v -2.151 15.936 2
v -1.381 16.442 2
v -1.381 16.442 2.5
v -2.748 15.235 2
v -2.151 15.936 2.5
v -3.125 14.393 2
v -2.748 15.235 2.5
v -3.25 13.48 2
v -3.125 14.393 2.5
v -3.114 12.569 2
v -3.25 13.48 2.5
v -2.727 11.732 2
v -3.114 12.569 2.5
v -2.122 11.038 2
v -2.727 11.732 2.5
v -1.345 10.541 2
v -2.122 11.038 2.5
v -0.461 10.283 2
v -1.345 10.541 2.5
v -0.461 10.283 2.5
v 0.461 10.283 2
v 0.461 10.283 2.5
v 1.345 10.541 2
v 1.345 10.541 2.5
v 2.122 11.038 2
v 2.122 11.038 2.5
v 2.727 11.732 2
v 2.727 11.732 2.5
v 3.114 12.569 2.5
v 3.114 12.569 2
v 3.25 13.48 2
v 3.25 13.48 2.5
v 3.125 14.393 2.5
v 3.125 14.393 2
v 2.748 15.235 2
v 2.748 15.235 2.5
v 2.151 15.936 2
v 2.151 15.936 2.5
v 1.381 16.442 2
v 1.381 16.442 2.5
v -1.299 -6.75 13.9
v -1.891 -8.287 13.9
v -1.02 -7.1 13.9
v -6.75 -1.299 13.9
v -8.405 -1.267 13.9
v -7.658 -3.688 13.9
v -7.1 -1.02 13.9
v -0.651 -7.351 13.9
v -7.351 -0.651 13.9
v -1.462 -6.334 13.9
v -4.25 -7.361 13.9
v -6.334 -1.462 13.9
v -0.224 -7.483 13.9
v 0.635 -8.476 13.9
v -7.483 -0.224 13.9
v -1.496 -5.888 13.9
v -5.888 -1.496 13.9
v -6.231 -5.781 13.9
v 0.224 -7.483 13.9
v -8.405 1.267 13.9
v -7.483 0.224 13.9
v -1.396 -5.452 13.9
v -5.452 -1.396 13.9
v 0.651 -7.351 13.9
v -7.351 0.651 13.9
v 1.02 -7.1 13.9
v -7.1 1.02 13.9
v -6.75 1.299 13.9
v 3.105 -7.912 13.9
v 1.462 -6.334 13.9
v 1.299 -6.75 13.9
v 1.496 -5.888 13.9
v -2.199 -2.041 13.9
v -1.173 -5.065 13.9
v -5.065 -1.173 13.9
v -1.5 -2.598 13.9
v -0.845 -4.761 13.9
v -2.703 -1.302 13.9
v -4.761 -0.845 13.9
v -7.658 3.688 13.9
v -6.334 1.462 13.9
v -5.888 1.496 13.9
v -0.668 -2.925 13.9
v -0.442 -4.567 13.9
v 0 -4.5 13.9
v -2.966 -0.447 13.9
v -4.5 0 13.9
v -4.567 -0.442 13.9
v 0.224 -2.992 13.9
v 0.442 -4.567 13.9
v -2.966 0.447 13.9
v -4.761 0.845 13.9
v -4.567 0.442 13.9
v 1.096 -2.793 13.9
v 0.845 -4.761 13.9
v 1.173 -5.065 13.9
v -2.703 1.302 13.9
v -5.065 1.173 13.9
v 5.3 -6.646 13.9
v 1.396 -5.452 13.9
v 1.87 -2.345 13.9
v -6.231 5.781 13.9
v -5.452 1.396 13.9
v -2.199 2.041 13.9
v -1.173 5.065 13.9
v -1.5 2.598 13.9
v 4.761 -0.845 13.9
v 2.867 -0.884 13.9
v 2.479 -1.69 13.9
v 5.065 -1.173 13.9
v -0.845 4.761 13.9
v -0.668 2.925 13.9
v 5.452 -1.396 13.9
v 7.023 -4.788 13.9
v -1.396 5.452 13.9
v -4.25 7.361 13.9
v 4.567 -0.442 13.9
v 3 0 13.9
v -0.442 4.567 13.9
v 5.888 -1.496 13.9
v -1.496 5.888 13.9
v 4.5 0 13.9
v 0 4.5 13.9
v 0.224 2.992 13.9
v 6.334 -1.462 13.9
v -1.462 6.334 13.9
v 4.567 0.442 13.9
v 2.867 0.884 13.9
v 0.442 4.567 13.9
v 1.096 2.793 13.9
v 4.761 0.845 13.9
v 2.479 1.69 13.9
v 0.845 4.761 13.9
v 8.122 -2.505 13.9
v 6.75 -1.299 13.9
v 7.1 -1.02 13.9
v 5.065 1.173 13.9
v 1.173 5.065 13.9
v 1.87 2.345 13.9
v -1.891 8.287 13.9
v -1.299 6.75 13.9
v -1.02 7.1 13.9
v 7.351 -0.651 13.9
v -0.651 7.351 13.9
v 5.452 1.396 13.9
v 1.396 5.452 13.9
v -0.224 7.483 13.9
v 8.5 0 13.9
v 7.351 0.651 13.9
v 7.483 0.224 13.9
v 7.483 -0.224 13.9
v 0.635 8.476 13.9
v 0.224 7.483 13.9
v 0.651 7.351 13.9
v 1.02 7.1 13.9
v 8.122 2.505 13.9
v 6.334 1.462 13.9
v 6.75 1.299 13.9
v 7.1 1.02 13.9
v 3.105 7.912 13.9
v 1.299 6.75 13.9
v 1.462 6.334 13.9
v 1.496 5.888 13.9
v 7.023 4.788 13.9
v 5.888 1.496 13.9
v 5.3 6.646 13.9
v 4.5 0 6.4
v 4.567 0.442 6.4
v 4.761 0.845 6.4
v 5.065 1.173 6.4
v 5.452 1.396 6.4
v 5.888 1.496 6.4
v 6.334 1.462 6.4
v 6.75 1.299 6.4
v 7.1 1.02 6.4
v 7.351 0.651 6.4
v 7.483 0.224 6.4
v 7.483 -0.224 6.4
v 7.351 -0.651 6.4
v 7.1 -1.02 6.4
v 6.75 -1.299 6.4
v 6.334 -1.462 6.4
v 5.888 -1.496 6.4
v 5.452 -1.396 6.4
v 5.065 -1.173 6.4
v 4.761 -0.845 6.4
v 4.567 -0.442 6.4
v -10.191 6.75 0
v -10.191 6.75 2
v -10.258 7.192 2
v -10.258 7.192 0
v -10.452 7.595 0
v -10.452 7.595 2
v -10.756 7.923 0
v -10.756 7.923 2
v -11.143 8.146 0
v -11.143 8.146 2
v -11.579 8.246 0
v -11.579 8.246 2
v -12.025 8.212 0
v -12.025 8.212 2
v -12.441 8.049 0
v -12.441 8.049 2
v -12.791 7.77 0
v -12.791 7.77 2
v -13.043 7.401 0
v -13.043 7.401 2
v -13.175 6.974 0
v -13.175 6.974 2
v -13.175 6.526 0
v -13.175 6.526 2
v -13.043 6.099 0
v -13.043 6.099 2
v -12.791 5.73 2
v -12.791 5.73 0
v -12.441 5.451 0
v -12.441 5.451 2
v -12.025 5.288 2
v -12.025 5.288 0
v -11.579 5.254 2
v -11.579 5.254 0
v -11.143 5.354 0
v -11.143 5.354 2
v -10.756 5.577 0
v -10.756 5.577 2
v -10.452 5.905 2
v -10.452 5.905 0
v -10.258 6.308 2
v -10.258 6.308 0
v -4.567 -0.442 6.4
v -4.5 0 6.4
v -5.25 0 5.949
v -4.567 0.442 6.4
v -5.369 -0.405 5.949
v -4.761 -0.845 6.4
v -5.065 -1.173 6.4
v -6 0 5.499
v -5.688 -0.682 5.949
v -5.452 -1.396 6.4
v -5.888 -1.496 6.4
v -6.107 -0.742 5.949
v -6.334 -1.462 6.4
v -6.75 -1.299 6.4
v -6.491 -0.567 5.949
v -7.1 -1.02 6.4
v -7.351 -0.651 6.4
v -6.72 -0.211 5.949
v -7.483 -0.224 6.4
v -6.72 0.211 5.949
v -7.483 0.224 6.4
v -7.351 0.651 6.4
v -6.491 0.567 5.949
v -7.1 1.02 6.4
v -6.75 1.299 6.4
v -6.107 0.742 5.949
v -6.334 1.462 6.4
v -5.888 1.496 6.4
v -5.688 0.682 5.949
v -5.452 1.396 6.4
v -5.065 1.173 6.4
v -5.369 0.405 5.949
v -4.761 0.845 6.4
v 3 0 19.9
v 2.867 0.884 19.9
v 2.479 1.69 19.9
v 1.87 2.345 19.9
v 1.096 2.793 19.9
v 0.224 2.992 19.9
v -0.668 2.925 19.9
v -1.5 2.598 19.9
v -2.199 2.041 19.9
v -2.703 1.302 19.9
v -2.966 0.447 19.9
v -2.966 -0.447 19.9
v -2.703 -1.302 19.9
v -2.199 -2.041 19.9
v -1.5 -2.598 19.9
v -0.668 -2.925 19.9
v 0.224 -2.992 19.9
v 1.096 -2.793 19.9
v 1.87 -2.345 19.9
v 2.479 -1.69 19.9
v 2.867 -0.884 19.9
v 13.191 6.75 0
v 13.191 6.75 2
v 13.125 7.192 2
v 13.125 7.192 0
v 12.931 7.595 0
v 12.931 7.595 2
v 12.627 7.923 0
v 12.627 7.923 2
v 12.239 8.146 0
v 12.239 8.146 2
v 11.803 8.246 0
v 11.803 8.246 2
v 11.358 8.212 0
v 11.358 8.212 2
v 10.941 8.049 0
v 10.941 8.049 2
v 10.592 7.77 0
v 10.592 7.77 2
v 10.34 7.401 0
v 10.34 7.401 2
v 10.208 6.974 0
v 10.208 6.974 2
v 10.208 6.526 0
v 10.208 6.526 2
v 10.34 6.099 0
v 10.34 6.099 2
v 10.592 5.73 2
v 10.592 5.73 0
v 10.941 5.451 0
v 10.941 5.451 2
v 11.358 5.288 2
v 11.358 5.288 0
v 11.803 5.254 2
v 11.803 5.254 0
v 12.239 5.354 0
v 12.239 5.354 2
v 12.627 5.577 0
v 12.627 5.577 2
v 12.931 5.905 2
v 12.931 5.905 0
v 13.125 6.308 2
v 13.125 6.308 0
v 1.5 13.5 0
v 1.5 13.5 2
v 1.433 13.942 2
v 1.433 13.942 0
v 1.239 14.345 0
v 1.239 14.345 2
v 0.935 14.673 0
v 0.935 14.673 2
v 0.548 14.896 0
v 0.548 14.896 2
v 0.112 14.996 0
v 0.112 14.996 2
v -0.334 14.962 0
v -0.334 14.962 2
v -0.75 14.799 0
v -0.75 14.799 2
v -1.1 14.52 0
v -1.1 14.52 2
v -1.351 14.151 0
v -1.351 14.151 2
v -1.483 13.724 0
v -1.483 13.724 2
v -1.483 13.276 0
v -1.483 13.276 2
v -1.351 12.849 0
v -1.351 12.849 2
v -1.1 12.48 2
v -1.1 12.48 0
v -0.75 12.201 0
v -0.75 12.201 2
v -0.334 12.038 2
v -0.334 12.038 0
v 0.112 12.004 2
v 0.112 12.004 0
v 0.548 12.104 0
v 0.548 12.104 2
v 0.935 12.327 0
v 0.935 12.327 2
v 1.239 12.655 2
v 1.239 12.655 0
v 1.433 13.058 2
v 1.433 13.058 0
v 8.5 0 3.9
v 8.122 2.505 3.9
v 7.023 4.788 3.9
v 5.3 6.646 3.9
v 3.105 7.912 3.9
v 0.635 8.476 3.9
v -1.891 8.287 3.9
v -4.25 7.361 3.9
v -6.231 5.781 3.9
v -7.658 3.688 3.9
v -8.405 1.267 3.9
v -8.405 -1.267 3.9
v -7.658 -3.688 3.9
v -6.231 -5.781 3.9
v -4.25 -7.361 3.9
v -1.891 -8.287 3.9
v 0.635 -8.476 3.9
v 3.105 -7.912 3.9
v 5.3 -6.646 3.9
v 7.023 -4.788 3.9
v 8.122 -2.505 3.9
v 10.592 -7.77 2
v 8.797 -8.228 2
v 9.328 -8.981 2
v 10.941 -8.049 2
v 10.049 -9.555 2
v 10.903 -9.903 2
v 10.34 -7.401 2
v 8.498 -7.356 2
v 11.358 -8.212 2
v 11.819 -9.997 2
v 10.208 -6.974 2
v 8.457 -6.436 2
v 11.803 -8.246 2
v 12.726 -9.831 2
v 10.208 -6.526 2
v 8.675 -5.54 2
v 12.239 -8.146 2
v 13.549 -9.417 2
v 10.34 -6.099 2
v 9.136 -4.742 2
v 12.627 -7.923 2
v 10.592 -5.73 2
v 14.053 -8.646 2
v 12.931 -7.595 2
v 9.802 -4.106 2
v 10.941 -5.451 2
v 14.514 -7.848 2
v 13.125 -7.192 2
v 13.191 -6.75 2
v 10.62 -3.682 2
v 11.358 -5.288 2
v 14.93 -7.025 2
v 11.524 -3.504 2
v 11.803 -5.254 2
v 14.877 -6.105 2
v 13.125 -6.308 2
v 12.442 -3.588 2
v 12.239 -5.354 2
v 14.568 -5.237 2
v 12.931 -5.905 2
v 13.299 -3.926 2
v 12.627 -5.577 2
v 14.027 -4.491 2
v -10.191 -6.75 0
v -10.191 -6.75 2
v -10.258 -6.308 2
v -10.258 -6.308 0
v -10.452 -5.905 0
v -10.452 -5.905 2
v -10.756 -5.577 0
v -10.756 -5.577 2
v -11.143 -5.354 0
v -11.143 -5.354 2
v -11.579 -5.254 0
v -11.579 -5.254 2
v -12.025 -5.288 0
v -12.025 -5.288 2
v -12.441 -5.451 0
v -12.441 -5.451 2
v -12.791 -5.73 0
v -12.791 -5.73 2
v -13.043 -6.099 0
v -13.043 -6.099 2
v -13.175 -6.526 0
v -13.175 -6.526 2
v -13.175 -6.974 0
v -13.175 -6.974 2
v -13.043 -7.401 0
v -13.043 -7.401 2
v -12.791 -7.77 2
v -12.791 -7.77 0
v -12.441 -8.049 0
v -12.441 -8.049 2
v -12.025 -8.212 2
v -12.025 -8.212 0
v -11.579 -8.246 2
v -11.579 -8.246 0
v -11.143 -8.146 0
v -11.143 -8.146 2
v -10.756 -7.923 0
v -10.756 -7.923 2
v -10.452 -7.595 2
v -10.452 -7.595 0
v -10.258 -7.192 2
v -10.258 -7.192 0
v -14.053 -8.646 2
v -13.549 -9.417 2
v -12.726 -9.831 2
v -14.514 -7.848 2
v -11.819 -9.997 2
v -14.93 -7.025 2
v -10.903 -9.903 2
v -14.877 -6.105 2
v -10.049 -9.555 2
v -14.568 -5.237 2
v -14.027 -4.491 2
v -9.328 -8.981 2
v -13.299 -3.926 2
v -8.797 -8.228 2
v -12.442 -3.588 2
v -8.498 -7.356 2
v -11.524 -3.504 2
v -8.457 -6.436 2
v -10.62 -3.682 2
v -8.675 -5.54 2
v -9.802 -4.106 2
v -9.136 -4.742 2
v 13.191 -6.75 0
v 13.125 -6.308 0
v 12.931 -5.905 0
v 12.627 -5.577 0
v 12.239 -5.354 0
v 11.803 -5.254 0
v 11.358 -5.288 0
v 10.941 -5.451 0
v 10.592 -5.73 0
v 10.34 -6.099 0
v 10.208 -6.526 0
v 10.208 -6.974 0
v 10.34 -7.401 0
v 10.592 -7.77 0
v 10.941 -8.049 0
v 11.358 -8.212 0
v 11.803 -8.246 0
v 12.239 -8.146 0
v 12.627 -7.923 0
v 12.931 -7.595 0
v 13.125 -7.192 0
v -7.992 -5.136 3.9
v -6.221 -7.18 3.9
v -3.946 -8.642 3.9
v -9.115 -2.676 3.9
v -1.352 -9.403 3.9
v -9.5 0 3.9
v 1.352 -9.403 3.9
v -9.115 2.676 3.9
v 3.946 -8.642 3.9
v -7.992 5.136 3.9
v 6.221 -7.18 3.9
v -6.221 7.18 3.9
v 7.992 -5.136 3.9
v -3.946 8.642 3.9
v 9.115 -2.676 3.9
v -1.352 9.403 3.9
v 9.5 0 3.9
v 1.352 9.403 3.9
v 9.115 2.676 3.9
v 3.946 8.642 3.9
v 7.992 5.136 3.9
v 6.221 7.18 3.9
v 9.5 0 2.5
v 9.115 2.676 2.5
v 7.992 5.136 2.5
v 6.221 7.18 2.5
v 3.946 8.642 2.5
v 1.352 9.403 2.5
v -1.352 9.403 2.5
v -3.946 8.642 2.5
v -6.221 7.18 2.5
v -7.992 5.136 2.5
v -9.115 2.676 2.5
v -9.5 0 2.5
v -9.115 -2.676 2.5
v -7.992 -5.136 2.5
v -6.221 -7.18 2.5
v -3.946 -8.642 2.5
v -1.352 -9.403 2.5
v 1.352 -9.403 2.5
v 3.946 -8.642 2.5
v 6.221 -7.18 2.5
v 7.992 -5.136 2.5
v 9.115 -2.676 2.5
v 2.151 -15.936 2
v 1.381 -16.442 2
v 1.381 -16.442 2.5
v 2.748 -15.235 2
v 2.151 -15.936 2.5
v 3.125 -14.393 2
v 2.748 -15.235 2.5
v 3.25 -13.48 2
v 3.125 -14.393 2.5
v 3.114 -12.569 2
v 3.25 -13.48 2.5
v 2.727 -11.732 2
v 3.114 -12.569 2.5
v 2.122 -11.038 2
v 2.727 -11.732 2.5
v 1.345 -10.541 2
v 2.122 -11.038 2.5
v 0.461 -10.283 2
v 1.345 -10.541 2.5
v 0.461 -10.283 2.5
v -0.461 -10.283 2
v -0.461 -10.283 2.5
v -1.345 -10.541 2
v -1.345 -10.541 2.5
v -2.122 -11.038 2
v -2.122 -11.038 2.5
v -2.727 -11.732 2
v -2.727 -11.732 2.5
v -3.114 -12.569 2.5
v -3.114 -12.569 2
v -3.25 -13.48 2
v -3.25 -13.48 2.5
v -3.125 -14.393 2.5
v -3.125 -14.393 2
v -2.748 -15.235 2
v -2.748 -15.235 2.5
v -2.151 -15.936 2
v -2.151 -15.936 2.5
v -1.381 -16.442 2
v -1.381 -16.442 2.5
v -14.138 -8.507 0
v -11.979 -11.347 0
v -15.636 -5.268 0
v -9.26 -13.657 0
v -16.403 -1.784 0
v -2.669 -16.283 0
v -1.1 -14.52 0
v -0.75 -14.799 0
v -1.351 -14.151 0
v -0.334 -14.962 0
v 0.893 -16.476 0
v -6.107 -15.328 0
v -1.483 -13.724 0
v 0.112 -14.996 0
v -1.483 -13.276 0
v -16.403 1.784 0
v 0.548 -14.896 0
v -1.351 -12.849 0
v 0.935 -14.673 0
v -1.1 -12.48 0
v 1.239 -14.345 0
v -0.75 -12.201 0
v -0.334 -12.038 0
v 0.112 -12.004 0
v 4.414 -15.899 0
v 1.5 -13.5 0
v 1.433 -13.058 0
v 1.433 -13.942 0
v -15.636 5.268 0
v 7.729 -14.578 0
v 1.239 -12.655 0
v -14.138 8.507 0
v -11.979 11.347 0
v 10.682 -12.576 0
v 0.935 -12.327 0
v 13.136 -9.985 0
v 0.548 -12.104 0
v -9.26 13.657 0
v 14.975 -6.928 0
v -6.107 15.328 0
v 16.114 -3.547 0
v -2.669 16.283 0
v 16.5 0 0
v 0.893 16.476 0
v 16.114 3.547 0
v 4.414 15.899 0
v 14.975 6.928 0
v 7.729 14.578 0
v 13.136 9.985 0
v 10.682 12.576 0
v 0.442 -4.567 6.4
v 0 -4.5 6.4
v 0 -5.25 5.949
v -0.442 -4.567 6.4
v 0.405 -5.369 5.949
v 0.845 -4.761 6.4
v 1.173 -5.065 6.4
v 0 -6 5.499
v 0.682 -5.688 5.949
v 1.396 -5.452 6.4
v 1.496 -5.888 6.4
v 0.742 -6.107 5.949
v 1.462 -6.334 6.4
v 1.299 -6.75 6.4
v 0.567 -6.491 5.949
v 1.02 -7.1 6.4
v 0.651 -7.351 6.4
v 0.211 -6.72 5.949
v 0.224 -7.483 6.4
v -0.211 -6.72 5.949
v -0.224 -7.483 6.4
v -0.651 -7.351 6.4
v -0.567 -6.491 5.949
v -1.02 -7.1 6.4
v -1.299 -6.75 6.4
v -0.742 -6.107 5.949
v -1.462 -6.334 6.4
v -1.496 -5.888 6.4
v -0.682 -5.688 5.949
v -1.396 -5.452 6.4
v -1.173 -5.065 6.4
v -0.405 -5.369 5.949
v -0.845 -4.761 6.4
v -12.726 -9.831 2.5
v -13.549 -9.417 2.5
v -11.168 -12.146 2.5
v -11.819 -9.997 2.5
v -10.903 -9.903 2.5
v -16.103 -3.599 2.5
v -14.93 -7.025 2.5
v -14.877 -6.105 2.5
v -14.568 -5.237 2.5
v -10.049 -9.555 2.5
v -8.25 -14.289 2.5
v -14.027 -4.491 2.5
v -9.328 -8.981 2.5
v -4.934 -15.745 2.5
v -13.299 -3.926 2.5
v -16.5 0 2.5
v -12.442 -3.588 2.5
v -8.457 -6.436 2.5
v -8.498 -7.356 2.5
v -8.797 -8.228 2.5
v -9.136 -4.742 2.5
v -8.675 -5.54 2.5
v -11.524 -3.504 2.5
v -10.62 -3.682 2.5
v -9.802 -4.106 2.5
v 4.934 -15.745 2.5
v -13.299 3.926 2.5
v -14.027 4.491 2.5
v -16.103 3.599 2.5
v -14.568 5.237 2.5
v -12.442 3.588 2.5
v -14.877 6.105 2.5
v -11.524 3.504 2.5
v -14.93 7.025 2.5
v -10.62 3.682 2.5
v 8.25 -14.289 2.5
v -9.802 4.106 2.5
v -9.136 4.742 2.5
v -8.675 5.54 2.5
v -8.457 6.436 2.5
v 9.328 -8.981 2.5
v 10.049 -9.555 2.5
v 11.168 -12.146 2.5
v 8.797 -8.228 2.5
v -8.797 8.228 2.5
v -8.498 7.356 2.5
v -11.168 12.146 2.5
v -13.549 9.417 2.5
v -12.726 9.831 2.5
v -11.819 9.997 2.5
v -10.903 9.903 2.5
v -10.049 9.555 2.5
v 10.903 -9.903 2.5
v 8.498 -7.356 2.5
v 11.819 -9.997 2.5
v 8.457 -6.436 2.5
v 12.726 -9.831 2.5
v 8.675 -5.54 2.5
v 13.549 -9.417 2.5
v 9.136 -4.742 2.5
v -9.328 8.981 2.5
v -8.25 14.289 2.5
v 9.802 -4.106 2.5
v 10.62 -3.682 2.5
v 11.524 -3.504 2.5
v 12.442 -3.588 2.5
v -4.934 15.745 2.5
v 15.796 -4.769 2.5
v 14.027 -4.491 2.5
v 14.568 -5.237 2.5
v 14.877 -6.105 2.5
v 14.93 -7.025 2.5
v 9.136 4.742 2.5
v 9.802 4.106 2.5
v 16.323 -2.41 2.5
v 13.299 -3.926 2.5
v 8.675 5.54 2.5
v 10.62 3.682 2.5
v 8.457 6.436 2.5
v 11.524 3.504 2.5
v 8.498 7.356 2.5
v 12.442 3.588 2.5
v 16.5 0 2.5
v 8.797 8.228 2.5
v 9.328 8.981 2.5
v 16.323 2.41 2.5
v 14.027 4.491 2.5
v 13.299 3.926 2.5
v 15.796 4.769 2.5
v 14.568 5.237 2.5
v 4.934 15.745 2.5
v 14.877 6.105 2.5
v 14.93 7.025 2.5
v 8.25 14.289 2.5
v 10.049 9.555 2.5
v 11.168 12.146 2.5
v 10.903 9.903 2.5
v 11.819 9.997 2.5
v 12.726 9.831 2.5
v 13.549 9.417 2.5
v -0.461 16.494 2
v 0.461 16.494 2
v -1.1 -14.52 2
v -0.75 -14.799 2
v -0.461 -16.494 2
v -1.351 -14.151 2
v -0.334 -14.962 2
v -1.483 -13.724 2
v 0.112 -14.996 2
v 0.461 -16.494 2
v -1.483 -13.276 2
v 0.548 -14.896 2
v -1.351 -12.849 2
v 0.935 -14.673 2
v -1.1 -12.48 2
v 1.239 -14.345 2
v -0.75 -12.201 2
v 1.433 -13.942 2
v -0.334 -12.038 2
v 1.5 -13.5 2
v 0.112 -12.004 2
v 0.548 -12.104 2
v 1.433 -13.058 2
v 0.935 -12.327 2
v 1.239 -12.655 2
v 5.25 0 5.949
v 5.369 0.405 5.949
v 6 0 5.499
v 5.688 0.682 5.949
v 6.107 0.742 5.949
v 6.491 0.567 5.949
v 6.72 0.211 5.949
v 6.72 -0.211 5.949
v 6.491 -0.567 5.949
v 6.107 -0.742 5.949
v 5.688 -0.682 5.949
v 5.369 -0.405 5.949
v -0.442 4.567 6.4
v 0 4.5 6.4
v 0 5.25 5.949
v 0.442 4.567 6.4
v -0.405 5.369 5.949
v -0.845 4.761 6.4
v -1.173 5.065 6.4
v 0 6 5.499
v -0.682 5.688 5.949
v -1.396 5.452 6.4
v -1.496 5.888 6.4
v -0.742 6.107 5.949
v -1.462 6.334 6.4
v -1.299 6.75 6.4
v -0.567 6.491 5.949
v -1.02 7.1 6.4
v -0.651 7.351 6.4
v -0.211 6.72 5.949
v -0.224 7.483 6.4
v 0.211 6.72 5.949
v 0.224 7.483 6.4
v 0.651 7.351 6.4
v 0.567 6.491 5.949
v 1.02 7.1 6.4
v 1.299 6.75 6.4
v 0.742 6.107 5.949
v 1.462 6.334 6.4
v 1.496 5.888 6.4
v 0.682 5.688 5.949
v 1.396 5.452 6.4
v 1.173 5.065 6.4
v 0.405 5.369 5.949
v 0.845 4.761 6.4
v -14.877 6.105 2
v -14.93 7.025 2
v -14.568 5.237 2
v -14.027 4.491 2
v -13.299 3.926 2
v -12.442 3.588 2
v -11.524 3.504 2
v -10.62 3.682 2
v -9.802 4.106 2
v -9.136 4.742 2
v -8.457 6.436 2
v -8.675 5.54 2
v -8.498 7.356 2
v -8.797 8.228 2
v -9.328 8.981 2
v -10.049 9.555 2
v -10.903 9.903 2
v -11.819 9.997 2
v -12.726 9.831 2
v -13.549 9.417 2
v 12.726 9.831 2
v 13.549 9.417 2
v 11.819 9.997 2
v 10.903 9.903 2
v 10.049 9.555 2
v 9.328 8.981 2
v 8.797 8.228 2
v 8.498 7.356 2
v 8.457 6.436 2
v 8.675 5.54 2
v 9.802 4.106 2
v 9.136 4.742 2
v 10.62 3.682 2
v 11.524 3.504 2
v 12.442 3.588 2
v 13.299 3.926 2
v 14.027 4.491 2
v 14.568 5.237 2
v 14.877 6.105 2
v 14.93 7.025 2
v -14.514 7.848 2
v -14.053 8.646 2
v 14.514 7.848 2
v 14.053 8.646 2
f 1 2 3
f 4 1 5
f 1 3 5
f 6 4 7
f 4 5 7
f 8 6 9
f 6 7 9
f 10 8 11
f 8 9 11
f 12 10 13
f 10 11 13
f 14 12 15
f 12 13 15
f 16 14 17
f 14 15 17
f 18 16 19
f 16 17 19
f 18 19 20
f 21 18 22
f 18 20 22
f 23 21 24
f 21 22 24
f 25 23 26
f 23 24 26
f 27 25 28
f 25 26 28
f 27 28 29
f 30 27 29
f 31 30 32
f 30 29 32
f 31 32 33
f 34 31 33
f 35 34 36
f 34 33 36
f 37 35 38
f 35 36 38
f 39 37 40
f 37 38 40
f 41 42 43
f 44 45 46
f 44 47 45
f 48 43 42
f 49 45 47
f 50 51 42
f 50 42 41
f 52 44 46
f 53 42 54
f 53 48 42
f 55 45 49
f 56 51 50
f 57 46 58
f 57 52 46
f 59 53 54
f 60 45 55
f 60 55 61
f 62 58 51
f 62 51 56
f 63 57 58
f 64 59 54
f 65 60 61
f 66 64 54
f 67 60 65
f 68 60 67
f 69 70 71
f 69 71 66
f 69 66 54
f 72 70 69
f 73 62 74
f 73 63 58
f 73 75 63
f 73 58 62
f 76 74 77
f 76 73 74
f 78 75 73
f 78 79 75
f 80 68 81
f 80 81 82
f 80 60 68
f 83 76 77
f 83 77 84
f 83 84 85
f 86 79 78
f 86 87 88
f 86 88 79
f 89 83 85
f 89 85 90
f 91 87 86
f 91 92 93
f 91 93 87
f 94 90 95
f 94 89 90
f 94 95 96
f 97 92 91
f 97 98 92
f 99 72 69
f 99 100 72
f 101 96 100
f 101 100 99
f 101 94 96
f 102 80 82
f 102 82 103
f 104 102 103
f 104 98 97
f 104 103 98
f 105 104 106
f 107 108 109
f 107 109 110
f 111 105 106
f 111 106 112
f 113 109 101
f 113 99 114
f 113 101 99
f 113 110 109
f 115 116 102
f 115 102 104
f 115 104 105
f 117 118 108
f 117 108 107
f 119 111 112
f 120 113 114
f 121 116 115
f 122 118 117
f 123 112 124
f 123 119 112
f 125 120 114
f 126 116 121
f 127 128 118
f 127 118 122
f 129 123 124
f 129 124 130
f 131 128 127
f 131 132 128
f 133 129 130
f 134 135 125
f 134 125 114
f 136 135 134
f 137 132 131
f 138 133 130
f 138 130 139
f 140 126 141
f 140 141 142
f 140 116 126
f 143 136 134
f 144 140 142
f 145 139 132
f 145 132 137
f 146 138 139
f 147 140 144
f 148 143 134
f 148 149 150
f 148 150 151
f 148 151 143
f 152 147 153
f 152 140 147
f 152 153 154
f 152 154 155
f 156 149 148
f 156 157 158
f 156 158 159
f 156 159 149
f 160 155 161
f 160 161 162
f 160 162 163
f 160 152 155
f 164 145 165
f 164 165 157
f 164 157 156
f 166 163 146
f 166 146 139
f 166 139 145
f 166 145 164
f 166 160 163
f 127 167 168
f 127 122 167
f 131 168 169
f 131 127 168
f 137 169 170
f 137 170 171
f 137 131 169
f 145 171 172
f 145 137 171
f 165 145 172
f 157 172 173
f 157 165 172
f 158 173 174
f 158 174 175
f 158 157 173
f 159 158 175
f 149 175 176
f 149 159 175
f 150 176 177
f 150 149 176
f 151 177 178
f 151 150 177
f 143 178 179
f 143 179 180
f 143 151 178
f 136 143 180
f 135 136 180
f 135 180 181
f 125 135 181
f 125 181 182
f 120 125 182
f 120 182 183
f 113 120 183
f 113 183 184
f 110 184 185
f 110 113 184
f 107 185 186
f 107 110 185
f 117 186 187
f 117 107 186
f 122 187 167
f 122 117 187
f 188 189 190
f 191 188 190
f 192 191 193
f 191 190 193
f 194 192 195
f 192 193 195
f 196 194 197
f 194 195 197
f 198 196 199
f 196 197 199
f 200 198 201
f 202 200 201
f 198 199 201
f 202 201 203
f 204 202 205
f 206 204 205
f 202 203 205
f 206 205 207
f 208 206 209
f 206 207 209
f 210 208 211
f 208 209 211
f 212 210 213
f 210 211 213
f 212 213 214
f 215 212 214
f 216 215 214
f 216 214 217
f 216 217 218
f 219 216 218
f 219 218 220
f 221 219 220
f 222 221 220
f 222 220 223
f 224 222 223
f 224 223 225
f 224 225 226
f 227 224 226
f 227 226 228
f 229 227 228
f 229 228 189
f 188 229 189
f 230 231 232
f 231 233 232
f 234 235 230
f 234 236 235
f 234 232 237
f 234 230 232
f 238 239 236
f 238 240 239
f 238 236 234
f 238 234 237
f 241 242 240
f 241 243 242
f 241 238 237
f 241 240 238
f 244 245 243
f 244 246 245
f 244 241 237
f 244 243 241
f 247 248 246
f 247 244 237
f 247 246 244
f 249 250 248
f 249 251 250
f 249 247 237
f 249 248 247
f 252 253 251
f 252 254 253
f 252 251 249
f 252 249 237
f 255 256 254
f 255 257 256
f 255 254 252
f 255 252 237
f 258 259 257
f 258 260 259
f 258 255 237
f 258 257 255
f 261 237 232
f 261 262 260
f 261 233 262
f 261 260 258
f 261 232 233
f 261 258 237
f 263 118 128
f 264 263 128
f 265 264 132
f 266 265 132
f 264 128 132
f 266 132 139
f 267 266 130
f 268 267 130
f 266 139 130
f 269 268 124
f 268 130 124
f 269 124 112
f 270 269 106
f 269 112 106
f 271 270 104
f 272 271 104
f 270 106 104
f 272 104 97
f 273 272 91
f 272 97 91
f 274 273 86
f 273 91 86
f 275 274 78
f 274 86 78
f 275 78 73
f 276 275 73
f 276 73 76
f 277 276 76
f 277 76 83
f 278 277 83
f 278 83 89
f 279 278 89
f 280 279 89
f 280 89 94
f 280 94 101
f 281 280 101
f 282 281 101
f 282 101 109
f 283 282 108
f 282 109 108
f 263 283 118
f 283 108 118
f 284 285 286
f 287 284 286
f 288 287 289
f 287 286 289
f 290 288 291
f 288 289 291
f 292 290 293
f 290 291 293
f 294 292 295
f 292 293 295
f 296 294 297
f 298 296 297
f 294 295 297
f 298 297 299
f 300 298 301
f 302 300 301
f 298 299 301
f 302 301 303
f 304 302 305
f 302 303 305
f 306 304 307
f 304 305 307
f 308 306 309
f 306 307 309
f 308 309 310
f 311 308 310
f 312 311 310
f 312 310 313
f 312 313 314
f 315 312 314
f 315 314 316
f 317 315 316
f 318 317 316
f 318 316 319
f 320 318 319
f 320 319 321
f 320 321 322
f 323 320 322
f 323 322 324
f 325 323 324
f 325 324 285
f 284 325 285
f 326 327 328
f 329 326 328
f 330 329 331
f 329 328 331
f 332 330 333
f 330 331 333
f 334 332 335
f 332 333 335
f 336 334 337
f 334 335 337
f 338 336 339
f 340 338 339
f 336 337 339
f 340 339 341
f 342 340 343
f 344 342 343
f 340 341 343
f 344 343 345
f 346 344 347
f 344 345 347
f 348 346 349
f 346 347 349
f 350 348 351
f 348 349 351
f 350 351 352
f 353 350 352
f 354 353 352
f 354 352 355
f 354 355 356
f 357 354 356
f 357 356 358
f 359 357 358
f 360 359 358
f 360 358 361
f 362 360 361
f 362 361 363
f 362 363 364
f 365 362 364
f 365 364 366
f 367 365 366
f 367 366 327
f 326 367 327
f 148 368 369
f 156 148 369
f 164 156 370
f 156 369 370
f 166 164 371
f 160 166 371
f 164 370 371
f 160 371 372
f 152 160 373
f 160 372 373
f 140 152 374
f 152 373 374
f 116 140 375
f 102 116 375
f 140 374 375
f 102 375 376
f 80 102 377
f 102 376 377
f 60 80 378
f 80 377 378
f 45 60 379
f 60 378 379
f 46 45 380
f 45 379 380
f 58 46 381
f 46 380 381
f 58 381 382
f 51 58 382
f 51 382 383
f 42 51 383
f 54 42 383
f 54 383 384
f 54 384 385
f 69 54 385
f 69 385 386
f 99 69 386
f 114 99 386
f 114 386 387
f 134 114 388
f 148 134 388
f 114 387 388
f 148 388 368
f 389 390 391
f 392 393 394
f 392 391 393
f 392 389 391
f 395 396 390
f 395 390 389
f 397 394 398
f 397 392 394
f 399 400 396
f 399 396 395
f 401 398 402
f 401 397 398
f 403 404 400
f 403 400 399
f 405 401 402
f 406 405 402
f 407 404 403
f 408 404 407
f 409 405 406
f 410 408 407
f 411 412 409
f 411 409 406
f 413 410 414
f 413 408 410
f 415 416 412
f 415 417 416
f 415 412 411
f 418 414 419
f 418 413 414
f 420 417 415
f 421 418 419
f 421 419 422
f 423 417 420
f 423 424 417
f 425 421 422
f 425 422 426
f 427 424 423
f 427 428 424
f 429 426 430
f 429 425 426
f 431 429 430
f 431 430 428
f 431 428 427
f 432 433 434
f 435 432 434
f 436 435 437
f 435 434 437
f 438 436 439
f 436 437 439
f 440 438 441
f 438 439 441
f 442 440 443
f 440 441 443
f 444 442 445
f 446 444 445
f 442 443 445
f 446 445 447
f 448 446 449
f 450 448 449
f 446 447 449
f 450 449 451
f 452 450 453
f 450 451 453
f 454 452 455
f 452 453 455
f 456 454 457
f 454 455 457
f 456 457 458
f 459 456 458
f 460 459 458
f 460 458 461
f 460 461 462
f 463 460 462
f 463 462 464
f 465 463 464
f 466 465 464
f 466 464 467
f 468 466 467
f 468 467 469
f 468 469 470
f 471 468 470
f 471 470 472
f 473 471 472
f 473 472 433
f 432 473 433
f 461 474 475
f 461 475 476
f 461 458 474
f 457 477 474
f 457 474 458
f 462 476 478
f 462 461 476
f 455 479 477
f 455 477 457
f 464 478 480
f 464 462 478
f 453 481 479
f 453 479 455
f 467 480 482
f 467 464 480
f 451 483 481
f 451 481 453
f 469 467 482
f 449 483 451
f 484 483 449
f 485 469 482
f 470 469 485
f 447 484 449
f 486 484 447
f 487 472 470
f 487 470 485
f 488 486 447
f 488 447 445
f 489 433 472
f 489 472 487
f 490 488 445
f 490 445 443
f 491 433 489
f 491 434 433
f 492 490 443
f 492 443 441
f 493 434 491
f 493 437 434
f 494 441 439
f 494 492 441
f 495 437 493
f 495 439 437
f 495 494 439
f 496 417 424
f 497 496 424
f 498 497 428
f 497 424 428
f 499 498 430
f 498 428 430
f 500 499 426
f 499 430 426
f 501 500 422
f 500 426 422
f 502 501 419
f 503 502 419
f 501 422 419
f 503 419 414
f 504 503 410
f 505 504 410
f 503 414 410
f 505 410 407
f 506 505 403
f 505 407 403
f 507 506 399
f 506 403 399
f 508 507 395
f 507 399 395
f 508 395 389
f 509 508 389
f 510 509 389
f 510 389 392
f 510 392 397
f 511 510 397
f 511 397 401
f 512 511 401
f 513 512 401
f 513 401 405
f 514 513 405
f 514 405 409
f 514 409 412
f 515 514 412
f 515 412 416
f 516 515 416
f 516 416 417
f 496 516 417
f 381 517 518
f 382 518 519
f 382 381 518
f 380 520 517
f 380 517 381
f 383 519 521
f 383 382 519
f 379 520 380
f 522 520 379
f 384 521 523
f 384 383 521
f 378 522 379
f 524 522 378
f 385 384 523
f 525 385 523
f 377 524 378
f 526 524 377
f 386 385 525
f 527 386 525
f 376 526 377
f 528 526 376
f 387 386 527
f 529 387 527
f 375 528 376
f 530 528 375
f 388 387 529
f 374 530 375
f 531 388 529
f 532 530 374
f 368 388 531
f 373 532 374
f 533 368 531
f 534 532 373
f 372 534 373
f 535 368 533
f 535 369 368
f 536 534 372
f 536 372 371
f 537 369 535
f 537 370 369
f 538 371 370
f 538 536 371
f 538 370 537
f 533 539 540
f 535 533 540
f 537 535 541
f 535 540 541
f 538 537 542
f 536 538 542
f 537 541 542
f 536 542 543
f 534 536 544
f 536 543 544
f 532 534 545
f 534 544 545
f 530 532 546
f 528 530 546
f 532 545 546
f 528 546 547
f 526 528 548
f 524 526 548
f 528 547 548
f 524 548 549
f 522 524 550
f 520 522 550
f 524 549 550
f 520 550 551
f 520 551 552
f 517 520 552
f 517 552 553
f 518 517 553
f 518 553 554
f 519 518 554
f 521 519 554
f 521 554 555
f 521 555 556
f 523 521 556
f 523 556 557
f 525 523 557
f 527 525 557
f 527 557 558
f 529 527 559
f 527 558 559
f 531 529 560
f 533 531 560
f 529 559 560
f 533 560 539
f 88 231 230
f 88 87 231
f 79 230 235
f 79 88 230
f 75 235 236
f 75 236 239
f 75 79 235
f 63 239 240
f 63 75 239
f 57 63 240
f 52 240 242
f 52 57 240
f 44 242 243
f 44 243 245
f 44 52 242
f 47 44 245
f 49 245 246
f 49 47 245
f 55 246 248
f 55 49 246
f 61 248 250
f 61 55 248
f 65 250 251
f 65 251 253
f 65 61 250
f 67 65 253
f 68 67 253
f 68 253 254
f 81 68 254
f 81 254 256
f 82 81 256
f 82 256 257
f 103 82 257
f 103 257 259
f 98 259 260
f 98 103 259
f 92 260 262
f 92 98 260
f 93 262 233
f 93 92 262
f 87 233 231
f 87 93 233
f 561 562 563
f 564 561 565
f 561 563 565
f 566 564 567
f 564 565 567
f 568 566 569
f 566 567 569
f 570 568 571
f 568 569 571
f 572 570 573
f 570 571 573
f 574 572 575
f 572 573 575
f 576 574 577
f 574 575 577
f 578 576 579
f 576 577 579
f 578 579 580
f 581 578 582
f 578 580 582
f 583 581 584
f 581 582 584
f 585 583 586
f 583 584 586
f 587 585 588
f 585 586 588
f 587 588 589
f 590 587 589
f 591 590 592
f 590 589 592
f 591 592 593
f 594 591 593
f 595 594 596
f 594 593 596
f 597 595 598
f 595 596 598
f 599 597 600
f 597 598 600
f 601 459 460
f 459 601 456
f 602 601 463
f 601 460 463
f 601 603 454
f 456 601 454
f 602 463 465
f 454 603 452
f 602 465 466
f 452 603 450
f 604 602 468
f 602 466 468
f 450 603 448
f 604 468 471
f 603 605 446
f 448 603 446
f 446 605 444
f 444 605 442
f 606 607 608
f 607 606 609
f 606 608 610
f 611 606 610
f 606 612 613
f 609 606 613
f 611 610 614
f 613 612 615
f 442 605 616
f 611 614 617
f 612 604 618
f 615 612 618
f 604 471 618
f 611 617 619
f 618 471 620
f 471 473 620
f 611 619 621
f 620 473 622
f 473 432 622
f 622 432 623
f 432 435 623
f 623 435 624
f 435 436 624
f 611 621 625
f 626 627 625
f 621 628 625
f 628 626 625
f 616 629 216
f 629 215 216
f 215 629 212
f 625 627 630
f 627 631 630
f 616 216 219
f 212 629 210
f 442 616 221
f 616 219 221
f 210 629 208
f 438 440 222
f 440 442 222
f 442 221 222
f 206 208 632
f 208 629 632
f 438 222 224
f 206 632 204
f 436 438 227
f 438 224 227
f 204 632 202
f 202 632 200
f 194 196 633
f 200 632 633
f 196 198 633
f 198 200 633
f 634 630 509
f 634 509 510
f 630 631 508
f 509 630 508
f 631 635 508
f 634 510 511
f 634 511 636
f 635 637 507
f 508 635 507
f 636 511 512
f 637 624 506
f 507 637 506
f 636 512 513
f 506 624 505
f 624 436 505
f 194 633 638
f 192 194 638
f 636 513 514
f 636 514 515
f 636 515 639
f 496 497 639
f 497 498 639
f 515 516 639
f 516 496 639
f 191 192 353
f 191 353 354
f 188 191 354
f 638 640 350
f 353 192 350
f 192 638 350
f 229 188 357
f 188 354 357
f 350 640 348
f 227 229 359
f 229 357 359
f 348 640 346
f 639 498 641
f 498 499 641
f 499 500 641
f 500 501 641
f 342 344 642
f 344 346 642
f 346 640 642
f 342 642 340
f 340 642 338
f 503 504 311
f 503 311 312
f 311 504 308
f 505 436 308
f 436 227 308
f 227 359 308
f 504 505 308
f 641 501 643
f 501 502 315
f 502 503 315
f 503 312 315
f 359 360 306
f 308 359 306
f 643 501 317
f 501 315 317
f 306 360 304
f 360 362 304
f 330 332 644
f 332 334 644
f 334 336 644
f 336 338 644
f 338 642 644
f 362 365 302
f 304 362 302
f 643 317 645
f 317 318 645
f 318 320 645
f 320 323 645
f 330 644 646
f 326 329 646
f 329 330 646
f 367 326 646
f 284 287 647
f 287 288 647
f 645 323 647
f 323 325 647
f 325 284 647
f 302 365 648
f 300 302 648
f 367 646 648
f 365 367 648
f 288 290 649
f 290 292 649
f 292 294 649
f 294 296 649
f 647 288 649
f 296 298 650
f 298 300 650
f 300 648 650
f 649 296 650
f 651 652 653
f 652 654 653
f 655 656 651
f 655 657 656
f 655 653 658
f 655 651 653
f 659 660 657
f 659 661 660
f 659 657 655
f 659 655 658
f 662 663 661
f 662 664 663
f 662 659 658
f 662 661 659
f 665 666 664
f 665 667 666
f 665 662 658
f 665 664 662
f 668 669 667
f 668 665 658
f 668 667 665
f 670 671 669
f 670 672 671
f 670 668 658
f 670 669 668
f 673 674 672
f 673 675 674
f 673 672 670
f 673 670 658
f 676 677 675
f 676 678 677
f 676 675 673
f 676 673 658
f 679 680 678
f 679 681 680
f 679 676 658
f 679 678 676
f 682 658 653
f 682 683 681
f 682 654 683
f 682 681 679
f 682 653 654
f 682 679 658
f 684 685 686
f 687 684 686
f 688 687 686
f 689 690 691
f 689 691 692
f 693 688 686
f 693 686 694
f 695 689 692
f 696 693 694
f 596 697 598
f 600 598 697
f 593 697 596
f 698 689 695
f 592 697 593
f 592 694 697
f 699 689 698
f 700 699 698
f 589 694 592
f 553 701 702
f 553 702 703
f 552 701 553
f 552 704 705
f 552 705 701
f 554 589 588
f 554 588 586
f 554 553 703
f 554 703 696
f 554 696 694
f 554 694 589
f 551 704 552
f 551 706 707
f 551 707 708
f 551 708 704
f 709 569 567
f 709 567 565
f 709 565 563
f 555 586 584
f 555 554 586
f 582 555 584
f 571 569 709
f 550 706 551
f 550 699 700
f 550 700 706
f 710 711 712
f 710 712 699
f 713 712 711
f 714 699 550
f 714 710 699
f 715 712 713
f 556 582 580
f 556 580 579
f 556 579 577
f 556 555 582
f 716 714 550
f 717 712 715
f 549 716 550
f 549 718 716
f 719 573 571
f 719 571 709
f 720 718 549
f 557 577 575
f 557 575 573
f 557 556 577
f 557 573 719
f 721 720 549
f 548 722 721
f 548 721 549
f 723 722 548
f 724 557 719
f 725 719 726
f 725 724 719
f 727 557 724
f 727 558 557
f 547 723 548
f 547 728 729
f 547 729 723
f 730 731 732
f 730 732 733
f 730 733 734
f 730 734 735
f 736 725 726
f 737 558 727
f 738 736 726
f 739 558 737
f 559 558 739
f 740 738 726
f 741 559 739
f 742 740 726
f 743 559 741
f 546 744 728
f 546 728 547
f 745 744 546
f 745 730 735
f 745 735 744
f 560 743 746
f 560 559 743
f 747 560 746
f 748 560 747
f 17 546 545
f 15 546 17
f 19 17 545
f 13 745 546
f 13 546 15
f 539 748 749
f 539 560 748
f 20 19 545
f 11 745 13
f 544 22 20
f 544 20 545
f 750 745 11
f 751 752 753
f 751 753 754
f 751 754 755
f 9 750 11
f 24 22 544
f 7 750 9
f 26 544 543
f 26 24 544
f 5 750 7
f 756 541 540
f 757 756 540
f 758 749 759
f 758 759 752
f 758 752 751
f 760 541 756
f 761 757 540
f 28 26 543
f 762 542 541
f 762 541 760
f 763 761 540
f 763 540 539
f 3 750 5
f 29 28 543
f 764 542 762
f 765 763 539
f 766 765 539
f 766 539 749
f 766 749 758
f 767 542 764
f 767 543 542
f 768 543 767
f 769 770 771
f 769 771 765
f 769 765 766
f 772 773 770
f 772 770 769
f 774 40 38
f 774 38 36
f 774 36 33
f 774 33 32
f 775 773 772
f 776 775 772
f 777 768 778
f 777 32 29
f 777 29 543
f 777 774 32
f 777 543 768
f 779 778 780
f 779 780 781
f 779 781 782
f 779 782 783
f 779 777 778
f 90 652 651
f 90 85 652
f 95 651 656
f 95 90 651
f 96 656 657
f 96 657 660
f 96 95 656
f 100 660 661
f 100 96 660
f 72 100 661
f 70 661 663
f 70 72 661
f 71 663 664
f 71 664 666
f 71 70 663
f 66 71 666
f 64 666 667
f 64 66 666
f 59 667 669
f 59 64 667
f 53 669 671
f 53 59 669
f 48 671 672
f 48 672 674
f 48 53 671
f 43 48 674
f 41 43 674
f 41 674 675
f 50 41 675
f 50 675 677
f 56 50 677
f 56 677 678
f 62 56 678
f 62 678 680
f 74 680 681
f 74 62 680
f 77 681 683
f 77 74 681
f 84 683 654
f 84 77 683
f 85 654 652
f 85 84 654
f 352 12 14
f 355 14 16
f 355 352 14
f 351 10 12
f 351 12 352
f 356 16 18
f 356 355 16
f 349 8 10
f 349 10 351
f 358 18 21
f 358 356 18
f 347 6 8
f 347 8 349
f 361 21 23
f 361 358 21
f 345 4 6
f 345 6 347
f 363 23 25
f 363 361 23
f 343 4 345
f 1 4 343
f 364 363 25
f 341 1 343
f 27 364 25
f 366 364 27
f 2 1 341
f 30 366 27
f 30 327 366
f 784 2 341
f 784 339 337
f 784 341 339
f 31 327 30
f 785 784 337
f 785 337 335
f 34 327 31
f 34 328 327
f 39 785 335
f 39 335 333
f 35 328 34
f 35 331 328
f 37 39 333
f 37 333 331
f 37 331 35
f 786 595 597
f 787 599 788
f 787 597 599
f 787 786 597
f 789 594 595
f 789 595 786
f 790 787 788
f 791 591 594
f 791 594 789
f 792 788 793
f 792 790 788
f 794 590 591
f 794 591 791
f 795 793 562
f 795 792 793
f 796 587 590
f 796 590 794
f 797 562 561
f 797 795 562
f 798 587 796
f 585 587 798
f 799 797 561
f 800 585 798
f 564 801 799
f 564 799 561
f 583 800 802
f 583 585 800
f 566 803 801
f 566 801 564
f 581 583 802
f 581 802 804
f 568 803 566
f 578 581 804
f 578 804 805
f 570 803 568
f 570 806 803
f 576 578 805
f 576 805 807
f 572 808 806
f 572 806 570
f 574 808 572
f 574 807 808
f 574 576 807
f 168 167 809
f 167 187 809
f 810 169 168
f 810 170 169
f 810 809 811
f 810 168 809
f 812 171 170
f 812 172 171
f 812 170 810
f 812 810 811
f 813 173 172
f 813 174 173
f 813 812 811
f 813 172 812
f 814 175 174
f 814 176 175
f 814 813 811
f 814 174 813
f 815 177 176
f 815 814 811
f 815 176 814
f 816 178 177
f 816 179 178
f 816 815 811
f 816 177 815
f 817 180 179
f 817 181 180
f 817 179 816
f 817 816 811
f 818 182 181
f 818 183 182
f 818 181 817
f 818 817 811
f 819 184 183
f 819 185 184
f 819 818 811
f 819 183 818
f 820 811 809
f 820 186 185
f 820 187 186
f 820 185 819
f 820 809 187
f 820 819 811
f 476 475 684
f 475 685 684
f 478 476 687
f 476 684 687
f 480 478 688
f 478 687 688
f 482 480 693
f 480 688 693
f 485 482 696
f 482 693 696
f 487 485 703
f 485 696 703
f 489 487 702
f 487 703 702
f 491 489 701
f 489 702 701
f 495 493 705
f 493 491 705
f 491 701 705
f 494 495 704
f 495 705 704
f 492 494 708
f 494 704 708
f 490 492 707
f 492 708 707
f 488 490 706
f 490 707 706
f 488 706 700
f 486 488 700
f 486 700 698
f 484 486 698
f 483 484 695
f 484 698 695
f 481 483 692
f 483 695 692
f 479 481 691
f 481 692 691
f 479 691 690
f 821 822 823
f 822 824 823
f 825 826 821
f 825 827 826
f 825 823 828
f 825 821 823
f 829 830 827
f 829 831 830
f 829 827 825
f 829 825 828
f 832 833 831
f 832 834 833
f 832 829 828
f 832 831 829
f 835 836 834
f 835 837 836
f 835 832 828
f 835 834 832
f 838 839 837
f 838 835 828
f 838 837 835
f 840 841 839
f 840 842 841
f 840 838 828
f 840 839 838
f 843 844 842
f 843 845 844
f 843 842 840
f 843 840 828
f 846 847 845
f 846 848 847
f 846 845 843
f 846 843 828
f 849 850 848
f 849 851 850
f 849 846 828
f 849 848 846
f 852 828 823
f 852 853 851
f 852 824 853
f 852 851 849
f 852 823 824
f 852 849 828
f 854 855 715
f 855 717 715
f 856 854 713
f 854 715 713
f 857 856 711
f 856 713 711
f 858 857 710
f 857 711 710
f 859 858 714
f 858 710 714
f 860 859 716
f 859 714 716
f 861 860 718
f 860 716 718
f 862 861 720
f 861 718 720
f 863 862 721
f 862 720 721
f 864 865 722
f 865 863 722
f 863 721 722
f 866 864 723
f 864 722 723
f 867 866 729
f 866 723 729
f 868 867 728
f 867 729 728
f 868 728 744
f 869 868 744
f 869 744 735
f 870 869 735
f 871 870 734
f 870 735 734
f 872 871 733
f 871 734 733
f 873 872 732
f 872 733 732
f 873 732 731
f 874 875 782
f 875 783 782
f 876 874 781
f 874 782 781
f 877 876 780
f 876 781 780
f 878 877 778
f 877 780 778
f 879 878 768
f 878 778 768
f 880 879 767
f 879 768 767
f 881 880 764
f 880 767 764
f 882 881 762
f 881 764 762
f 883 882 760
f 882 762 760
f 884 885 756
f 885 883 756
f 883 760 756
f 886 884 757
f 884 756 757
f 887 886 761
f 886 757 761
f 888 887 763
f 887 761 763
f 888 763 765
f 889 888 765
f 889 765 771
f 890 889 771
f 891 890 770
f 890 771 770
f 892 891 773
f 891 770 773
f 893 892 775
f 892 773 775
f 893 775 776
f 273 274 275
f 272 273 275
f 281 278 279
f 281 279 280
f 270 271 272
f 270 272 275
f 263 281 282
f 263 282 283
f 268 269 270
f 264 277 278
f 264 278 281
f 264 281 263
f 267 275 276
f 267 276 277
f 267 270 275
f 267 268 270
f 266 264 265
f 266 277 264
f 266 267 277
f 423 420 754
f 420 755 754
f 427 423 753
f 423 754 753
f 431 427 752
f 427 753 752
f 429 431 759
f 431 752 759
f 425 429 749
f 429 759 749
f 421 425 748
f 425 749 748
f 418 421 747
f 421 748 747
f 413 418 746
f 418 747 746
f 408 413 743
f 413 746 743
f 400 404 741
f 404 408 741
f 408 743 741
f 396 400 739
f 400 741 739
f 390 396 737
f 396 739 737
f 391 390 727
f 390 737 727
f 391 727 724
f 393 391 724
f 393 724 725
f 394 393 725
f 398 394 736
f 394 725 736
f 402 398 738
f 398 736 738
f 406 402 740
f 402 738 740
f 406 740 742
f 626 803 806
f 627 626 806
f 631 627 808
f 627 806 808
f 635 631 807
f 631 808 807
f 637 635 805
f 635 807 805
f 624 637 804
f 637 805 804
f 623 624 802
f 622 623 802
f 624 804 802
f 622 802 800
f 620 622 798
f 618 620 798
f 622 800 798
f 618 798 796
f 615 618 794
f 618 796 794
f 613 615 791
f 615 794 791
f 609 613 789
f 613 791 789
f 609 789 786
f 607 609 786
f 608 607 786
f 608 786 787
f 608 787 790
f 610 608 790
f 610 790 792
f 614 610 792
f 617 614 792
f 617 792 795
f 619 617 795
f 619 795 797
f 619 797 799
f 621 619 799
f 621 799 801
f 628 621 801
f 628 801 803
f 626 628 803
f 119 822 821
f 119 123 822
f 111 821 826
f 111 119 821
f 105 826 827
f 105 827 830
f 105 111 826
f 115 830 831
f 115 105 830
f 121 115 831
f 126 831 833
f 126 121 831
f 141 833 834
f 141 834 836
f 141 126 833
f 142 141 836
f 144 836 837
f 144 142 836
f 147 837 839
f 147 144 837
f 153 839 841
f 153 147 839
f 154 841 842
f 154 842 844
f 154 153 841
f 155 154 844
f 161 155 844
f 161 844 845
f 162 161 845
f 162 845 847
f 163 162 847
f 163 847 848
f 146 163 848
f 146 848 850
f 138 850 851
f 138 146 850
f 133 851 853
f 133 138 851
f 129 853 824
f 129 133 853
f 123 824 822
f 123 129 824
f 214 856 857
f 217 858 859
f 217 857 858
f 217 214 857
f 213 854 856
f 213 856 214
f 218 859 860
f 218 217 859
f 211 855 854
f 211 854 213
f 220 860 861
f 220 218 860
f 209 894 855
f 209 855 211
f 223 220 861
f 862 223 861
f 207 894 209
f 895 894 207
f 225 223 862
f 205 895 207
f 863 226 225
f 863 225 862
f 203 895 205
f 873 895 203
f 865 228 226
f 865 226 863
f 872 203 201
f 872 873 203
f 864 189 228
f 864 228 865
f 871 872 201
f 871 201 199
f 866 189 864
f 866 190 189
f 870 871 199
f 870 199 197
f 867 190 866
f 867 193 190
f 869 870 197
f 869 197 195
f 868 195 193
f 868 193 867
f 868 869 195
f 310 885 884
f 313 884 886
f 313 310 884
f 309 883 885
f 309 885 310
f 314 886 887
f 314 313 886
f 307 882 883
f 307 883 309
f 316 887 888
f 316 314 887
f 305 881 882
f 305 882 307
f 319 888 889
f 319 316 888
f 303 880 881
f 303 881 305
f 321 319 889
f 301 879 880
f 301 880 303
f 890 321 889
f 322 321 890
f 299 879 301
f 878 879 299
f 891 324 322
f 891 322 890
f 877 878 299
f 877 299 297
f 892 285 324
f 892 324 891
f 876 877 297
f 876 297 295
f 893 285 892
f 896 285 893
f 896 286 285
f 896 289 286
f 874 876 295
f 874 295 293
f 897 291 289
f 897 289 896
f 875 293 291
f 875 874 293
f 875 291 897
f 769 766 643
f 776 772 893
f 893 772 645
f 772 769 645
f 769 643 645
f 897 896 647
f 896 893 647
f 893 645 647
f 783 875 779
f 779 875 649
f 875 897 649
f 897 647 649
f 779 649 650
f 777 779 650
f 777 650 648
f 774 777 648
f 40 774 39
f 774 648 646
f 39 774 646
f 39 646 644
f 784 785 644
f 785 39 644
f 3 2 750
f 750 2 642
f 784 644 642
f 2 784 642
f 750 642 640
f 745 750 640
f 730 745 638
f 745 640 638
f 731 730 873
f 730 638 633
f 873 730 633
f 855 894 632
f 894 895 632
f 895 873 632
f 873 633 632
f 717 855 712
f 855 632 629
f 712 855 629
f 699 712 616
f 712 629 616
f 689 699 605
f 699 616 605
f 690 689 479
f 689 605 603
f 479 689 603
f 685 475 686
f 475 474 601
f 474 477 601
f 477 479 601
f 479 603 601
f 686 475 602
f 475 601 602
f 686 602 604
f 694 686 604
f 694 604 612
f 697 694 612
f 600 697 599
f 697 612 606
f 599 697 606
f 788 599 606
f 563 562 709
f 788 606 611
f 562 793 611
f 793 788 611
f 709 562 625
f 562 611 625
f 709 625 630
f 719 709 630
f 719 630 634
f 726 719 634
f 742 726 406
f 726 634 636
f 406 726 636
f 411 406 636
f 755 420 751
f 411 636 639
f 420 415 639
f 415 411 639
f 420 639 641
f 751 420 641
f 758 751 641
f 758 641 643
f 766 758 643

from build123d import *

# Parameters (mm, degrees)
SKETCH_1_R               = 16.5
EXTRUDE_1_DEPTH          = 2.5
SKETCH_2_R               = 9.5
EXTRUDE_2_DEPTH          = 1.4
SKETCH_3_R               = 1.5
CUT_EXTRUDE_1_DEPTH      = 3
SKETCH_4_R               = 8.5
EXTRUDE_3_DEPTH          = 10
PATTERN_CIRCULAR_1_COUNT = 4
SKETCH_8_R               = 3
EXTRUDE_4_DEPTH          = 6
SKETCH_9_R               = 3.25
CUT_EXTRUDE_2_DEPTH      = 0.5


with BuildPart() as part:
    # 草图1 → 凸台-拉伸1 (new body)
    with BuildSketch(Plane.XY):
        Circle(SKETCH_1_R)
    extrude(amount=EXTRUDE_1_DEPTH)

    # 草图2 → 凸台-拉伸2 (add)
    with BuildSketch(Plane.XY.offset(2.5)):
        Circle(SKETCH_2_R)
    extrude(amount=EXTRUDE_2_DEPTH)

    # 草图3 → 切除-拉伸1 (cut)
    with BuildSketch(Plane.XY.offset(2.5)):
        with Locations((0, 13.5)):
            Circle(SKETCH_3_R)
        with Locations((11.691342951, 6.75)):
            Circle(SKETCH_3_R)
        with Locations((11.691342951, -6.75)):
            Circle(SKETCH_3_R)
        with Locations((0, -13.5)):
            Circle(SKETCH_3_R)
        with Locations((-11.691342951, -6.75)):
            Circle(SKETCH_3_R)
        with Locations((-11.691342951, 6.75)):
            Circle(SKETCH_3_R)
    extrude(amount=-CUT_EXTRUDE_1_DEPTH, mode=Mode.SUBTRACT)

    # 草图4 → 凸台-拉伸3 (add)
    with BuildSketch(Plane.XY.offset(3.9)):
        Circle(SKETCH_4_R)
    extrude(amount=EXTRUDE_3_DEPTH)

    # 草图7 → M3 螺纹孔1 (revolve, cut)
    with BuildSketch(Plane(origin=(0, 6, 13.9), x_dir=(0, -1, 0), z_dir=(1, 0, 0))):
        Polygon((0, 0), (0, 8.401290929), (1.5, 7.5), (1.5, 0), align=None)
    hole_wizard_m3_1 = revolve(axis=Axis((0, 6, 20.25), (0, 0, -1)), mode=Mode.SUBTRACT)

    # 阵列(圆周)1: M3 螺纹孔1 ×4 about axis
    pattern_circular_1_axis = Axis((0, 0, 0), (0, 0, 1))
    for i in range(1, PATTERN_CIRCULAR_1_COUNT):
        add(hole_wizard_m3_1.rotate(pattern_circular_1_axis, i * 360 / PATTERN_CIRCULAR_1_COUNT), mode=Mode.SUBTRACT)

    # 草图8 → 凸台-拉伸4 (add)
    with BuildSketch(Plane.XY.offset(13.9)):
        Circle(SKETCH_8_R)
    extrude(amount=EXTRUDE_4_DEPTH)

    # 草图9 → 切除-拉伸2 (cut)
    with BuildSketch(Plane.XY.offset(2.5)):
        with Locations((0, 13.5)):
            Circle(SKETCH_9_R)
        with Locations((11.691342951, 6.75)):
            Circle(SKETCH_9_R)
        with Locations((11.691342951, -6.75)):
            Circle(SKETCH_9_R)
        with Locations((0, -13.5)):
            Circle(SKETCH_9_R)
        with Locations((-11.691342951, -6.75)):
            Circle(SKETCH_9_R)
        with Locations((-11.691342951, 6.75)):
            Circle(SKETCH_9_R)
    extrude(amount=-CUT_EXTRUDE_2_DEPTH, mode=Mode.SUBTRACT)


solid = part.part
